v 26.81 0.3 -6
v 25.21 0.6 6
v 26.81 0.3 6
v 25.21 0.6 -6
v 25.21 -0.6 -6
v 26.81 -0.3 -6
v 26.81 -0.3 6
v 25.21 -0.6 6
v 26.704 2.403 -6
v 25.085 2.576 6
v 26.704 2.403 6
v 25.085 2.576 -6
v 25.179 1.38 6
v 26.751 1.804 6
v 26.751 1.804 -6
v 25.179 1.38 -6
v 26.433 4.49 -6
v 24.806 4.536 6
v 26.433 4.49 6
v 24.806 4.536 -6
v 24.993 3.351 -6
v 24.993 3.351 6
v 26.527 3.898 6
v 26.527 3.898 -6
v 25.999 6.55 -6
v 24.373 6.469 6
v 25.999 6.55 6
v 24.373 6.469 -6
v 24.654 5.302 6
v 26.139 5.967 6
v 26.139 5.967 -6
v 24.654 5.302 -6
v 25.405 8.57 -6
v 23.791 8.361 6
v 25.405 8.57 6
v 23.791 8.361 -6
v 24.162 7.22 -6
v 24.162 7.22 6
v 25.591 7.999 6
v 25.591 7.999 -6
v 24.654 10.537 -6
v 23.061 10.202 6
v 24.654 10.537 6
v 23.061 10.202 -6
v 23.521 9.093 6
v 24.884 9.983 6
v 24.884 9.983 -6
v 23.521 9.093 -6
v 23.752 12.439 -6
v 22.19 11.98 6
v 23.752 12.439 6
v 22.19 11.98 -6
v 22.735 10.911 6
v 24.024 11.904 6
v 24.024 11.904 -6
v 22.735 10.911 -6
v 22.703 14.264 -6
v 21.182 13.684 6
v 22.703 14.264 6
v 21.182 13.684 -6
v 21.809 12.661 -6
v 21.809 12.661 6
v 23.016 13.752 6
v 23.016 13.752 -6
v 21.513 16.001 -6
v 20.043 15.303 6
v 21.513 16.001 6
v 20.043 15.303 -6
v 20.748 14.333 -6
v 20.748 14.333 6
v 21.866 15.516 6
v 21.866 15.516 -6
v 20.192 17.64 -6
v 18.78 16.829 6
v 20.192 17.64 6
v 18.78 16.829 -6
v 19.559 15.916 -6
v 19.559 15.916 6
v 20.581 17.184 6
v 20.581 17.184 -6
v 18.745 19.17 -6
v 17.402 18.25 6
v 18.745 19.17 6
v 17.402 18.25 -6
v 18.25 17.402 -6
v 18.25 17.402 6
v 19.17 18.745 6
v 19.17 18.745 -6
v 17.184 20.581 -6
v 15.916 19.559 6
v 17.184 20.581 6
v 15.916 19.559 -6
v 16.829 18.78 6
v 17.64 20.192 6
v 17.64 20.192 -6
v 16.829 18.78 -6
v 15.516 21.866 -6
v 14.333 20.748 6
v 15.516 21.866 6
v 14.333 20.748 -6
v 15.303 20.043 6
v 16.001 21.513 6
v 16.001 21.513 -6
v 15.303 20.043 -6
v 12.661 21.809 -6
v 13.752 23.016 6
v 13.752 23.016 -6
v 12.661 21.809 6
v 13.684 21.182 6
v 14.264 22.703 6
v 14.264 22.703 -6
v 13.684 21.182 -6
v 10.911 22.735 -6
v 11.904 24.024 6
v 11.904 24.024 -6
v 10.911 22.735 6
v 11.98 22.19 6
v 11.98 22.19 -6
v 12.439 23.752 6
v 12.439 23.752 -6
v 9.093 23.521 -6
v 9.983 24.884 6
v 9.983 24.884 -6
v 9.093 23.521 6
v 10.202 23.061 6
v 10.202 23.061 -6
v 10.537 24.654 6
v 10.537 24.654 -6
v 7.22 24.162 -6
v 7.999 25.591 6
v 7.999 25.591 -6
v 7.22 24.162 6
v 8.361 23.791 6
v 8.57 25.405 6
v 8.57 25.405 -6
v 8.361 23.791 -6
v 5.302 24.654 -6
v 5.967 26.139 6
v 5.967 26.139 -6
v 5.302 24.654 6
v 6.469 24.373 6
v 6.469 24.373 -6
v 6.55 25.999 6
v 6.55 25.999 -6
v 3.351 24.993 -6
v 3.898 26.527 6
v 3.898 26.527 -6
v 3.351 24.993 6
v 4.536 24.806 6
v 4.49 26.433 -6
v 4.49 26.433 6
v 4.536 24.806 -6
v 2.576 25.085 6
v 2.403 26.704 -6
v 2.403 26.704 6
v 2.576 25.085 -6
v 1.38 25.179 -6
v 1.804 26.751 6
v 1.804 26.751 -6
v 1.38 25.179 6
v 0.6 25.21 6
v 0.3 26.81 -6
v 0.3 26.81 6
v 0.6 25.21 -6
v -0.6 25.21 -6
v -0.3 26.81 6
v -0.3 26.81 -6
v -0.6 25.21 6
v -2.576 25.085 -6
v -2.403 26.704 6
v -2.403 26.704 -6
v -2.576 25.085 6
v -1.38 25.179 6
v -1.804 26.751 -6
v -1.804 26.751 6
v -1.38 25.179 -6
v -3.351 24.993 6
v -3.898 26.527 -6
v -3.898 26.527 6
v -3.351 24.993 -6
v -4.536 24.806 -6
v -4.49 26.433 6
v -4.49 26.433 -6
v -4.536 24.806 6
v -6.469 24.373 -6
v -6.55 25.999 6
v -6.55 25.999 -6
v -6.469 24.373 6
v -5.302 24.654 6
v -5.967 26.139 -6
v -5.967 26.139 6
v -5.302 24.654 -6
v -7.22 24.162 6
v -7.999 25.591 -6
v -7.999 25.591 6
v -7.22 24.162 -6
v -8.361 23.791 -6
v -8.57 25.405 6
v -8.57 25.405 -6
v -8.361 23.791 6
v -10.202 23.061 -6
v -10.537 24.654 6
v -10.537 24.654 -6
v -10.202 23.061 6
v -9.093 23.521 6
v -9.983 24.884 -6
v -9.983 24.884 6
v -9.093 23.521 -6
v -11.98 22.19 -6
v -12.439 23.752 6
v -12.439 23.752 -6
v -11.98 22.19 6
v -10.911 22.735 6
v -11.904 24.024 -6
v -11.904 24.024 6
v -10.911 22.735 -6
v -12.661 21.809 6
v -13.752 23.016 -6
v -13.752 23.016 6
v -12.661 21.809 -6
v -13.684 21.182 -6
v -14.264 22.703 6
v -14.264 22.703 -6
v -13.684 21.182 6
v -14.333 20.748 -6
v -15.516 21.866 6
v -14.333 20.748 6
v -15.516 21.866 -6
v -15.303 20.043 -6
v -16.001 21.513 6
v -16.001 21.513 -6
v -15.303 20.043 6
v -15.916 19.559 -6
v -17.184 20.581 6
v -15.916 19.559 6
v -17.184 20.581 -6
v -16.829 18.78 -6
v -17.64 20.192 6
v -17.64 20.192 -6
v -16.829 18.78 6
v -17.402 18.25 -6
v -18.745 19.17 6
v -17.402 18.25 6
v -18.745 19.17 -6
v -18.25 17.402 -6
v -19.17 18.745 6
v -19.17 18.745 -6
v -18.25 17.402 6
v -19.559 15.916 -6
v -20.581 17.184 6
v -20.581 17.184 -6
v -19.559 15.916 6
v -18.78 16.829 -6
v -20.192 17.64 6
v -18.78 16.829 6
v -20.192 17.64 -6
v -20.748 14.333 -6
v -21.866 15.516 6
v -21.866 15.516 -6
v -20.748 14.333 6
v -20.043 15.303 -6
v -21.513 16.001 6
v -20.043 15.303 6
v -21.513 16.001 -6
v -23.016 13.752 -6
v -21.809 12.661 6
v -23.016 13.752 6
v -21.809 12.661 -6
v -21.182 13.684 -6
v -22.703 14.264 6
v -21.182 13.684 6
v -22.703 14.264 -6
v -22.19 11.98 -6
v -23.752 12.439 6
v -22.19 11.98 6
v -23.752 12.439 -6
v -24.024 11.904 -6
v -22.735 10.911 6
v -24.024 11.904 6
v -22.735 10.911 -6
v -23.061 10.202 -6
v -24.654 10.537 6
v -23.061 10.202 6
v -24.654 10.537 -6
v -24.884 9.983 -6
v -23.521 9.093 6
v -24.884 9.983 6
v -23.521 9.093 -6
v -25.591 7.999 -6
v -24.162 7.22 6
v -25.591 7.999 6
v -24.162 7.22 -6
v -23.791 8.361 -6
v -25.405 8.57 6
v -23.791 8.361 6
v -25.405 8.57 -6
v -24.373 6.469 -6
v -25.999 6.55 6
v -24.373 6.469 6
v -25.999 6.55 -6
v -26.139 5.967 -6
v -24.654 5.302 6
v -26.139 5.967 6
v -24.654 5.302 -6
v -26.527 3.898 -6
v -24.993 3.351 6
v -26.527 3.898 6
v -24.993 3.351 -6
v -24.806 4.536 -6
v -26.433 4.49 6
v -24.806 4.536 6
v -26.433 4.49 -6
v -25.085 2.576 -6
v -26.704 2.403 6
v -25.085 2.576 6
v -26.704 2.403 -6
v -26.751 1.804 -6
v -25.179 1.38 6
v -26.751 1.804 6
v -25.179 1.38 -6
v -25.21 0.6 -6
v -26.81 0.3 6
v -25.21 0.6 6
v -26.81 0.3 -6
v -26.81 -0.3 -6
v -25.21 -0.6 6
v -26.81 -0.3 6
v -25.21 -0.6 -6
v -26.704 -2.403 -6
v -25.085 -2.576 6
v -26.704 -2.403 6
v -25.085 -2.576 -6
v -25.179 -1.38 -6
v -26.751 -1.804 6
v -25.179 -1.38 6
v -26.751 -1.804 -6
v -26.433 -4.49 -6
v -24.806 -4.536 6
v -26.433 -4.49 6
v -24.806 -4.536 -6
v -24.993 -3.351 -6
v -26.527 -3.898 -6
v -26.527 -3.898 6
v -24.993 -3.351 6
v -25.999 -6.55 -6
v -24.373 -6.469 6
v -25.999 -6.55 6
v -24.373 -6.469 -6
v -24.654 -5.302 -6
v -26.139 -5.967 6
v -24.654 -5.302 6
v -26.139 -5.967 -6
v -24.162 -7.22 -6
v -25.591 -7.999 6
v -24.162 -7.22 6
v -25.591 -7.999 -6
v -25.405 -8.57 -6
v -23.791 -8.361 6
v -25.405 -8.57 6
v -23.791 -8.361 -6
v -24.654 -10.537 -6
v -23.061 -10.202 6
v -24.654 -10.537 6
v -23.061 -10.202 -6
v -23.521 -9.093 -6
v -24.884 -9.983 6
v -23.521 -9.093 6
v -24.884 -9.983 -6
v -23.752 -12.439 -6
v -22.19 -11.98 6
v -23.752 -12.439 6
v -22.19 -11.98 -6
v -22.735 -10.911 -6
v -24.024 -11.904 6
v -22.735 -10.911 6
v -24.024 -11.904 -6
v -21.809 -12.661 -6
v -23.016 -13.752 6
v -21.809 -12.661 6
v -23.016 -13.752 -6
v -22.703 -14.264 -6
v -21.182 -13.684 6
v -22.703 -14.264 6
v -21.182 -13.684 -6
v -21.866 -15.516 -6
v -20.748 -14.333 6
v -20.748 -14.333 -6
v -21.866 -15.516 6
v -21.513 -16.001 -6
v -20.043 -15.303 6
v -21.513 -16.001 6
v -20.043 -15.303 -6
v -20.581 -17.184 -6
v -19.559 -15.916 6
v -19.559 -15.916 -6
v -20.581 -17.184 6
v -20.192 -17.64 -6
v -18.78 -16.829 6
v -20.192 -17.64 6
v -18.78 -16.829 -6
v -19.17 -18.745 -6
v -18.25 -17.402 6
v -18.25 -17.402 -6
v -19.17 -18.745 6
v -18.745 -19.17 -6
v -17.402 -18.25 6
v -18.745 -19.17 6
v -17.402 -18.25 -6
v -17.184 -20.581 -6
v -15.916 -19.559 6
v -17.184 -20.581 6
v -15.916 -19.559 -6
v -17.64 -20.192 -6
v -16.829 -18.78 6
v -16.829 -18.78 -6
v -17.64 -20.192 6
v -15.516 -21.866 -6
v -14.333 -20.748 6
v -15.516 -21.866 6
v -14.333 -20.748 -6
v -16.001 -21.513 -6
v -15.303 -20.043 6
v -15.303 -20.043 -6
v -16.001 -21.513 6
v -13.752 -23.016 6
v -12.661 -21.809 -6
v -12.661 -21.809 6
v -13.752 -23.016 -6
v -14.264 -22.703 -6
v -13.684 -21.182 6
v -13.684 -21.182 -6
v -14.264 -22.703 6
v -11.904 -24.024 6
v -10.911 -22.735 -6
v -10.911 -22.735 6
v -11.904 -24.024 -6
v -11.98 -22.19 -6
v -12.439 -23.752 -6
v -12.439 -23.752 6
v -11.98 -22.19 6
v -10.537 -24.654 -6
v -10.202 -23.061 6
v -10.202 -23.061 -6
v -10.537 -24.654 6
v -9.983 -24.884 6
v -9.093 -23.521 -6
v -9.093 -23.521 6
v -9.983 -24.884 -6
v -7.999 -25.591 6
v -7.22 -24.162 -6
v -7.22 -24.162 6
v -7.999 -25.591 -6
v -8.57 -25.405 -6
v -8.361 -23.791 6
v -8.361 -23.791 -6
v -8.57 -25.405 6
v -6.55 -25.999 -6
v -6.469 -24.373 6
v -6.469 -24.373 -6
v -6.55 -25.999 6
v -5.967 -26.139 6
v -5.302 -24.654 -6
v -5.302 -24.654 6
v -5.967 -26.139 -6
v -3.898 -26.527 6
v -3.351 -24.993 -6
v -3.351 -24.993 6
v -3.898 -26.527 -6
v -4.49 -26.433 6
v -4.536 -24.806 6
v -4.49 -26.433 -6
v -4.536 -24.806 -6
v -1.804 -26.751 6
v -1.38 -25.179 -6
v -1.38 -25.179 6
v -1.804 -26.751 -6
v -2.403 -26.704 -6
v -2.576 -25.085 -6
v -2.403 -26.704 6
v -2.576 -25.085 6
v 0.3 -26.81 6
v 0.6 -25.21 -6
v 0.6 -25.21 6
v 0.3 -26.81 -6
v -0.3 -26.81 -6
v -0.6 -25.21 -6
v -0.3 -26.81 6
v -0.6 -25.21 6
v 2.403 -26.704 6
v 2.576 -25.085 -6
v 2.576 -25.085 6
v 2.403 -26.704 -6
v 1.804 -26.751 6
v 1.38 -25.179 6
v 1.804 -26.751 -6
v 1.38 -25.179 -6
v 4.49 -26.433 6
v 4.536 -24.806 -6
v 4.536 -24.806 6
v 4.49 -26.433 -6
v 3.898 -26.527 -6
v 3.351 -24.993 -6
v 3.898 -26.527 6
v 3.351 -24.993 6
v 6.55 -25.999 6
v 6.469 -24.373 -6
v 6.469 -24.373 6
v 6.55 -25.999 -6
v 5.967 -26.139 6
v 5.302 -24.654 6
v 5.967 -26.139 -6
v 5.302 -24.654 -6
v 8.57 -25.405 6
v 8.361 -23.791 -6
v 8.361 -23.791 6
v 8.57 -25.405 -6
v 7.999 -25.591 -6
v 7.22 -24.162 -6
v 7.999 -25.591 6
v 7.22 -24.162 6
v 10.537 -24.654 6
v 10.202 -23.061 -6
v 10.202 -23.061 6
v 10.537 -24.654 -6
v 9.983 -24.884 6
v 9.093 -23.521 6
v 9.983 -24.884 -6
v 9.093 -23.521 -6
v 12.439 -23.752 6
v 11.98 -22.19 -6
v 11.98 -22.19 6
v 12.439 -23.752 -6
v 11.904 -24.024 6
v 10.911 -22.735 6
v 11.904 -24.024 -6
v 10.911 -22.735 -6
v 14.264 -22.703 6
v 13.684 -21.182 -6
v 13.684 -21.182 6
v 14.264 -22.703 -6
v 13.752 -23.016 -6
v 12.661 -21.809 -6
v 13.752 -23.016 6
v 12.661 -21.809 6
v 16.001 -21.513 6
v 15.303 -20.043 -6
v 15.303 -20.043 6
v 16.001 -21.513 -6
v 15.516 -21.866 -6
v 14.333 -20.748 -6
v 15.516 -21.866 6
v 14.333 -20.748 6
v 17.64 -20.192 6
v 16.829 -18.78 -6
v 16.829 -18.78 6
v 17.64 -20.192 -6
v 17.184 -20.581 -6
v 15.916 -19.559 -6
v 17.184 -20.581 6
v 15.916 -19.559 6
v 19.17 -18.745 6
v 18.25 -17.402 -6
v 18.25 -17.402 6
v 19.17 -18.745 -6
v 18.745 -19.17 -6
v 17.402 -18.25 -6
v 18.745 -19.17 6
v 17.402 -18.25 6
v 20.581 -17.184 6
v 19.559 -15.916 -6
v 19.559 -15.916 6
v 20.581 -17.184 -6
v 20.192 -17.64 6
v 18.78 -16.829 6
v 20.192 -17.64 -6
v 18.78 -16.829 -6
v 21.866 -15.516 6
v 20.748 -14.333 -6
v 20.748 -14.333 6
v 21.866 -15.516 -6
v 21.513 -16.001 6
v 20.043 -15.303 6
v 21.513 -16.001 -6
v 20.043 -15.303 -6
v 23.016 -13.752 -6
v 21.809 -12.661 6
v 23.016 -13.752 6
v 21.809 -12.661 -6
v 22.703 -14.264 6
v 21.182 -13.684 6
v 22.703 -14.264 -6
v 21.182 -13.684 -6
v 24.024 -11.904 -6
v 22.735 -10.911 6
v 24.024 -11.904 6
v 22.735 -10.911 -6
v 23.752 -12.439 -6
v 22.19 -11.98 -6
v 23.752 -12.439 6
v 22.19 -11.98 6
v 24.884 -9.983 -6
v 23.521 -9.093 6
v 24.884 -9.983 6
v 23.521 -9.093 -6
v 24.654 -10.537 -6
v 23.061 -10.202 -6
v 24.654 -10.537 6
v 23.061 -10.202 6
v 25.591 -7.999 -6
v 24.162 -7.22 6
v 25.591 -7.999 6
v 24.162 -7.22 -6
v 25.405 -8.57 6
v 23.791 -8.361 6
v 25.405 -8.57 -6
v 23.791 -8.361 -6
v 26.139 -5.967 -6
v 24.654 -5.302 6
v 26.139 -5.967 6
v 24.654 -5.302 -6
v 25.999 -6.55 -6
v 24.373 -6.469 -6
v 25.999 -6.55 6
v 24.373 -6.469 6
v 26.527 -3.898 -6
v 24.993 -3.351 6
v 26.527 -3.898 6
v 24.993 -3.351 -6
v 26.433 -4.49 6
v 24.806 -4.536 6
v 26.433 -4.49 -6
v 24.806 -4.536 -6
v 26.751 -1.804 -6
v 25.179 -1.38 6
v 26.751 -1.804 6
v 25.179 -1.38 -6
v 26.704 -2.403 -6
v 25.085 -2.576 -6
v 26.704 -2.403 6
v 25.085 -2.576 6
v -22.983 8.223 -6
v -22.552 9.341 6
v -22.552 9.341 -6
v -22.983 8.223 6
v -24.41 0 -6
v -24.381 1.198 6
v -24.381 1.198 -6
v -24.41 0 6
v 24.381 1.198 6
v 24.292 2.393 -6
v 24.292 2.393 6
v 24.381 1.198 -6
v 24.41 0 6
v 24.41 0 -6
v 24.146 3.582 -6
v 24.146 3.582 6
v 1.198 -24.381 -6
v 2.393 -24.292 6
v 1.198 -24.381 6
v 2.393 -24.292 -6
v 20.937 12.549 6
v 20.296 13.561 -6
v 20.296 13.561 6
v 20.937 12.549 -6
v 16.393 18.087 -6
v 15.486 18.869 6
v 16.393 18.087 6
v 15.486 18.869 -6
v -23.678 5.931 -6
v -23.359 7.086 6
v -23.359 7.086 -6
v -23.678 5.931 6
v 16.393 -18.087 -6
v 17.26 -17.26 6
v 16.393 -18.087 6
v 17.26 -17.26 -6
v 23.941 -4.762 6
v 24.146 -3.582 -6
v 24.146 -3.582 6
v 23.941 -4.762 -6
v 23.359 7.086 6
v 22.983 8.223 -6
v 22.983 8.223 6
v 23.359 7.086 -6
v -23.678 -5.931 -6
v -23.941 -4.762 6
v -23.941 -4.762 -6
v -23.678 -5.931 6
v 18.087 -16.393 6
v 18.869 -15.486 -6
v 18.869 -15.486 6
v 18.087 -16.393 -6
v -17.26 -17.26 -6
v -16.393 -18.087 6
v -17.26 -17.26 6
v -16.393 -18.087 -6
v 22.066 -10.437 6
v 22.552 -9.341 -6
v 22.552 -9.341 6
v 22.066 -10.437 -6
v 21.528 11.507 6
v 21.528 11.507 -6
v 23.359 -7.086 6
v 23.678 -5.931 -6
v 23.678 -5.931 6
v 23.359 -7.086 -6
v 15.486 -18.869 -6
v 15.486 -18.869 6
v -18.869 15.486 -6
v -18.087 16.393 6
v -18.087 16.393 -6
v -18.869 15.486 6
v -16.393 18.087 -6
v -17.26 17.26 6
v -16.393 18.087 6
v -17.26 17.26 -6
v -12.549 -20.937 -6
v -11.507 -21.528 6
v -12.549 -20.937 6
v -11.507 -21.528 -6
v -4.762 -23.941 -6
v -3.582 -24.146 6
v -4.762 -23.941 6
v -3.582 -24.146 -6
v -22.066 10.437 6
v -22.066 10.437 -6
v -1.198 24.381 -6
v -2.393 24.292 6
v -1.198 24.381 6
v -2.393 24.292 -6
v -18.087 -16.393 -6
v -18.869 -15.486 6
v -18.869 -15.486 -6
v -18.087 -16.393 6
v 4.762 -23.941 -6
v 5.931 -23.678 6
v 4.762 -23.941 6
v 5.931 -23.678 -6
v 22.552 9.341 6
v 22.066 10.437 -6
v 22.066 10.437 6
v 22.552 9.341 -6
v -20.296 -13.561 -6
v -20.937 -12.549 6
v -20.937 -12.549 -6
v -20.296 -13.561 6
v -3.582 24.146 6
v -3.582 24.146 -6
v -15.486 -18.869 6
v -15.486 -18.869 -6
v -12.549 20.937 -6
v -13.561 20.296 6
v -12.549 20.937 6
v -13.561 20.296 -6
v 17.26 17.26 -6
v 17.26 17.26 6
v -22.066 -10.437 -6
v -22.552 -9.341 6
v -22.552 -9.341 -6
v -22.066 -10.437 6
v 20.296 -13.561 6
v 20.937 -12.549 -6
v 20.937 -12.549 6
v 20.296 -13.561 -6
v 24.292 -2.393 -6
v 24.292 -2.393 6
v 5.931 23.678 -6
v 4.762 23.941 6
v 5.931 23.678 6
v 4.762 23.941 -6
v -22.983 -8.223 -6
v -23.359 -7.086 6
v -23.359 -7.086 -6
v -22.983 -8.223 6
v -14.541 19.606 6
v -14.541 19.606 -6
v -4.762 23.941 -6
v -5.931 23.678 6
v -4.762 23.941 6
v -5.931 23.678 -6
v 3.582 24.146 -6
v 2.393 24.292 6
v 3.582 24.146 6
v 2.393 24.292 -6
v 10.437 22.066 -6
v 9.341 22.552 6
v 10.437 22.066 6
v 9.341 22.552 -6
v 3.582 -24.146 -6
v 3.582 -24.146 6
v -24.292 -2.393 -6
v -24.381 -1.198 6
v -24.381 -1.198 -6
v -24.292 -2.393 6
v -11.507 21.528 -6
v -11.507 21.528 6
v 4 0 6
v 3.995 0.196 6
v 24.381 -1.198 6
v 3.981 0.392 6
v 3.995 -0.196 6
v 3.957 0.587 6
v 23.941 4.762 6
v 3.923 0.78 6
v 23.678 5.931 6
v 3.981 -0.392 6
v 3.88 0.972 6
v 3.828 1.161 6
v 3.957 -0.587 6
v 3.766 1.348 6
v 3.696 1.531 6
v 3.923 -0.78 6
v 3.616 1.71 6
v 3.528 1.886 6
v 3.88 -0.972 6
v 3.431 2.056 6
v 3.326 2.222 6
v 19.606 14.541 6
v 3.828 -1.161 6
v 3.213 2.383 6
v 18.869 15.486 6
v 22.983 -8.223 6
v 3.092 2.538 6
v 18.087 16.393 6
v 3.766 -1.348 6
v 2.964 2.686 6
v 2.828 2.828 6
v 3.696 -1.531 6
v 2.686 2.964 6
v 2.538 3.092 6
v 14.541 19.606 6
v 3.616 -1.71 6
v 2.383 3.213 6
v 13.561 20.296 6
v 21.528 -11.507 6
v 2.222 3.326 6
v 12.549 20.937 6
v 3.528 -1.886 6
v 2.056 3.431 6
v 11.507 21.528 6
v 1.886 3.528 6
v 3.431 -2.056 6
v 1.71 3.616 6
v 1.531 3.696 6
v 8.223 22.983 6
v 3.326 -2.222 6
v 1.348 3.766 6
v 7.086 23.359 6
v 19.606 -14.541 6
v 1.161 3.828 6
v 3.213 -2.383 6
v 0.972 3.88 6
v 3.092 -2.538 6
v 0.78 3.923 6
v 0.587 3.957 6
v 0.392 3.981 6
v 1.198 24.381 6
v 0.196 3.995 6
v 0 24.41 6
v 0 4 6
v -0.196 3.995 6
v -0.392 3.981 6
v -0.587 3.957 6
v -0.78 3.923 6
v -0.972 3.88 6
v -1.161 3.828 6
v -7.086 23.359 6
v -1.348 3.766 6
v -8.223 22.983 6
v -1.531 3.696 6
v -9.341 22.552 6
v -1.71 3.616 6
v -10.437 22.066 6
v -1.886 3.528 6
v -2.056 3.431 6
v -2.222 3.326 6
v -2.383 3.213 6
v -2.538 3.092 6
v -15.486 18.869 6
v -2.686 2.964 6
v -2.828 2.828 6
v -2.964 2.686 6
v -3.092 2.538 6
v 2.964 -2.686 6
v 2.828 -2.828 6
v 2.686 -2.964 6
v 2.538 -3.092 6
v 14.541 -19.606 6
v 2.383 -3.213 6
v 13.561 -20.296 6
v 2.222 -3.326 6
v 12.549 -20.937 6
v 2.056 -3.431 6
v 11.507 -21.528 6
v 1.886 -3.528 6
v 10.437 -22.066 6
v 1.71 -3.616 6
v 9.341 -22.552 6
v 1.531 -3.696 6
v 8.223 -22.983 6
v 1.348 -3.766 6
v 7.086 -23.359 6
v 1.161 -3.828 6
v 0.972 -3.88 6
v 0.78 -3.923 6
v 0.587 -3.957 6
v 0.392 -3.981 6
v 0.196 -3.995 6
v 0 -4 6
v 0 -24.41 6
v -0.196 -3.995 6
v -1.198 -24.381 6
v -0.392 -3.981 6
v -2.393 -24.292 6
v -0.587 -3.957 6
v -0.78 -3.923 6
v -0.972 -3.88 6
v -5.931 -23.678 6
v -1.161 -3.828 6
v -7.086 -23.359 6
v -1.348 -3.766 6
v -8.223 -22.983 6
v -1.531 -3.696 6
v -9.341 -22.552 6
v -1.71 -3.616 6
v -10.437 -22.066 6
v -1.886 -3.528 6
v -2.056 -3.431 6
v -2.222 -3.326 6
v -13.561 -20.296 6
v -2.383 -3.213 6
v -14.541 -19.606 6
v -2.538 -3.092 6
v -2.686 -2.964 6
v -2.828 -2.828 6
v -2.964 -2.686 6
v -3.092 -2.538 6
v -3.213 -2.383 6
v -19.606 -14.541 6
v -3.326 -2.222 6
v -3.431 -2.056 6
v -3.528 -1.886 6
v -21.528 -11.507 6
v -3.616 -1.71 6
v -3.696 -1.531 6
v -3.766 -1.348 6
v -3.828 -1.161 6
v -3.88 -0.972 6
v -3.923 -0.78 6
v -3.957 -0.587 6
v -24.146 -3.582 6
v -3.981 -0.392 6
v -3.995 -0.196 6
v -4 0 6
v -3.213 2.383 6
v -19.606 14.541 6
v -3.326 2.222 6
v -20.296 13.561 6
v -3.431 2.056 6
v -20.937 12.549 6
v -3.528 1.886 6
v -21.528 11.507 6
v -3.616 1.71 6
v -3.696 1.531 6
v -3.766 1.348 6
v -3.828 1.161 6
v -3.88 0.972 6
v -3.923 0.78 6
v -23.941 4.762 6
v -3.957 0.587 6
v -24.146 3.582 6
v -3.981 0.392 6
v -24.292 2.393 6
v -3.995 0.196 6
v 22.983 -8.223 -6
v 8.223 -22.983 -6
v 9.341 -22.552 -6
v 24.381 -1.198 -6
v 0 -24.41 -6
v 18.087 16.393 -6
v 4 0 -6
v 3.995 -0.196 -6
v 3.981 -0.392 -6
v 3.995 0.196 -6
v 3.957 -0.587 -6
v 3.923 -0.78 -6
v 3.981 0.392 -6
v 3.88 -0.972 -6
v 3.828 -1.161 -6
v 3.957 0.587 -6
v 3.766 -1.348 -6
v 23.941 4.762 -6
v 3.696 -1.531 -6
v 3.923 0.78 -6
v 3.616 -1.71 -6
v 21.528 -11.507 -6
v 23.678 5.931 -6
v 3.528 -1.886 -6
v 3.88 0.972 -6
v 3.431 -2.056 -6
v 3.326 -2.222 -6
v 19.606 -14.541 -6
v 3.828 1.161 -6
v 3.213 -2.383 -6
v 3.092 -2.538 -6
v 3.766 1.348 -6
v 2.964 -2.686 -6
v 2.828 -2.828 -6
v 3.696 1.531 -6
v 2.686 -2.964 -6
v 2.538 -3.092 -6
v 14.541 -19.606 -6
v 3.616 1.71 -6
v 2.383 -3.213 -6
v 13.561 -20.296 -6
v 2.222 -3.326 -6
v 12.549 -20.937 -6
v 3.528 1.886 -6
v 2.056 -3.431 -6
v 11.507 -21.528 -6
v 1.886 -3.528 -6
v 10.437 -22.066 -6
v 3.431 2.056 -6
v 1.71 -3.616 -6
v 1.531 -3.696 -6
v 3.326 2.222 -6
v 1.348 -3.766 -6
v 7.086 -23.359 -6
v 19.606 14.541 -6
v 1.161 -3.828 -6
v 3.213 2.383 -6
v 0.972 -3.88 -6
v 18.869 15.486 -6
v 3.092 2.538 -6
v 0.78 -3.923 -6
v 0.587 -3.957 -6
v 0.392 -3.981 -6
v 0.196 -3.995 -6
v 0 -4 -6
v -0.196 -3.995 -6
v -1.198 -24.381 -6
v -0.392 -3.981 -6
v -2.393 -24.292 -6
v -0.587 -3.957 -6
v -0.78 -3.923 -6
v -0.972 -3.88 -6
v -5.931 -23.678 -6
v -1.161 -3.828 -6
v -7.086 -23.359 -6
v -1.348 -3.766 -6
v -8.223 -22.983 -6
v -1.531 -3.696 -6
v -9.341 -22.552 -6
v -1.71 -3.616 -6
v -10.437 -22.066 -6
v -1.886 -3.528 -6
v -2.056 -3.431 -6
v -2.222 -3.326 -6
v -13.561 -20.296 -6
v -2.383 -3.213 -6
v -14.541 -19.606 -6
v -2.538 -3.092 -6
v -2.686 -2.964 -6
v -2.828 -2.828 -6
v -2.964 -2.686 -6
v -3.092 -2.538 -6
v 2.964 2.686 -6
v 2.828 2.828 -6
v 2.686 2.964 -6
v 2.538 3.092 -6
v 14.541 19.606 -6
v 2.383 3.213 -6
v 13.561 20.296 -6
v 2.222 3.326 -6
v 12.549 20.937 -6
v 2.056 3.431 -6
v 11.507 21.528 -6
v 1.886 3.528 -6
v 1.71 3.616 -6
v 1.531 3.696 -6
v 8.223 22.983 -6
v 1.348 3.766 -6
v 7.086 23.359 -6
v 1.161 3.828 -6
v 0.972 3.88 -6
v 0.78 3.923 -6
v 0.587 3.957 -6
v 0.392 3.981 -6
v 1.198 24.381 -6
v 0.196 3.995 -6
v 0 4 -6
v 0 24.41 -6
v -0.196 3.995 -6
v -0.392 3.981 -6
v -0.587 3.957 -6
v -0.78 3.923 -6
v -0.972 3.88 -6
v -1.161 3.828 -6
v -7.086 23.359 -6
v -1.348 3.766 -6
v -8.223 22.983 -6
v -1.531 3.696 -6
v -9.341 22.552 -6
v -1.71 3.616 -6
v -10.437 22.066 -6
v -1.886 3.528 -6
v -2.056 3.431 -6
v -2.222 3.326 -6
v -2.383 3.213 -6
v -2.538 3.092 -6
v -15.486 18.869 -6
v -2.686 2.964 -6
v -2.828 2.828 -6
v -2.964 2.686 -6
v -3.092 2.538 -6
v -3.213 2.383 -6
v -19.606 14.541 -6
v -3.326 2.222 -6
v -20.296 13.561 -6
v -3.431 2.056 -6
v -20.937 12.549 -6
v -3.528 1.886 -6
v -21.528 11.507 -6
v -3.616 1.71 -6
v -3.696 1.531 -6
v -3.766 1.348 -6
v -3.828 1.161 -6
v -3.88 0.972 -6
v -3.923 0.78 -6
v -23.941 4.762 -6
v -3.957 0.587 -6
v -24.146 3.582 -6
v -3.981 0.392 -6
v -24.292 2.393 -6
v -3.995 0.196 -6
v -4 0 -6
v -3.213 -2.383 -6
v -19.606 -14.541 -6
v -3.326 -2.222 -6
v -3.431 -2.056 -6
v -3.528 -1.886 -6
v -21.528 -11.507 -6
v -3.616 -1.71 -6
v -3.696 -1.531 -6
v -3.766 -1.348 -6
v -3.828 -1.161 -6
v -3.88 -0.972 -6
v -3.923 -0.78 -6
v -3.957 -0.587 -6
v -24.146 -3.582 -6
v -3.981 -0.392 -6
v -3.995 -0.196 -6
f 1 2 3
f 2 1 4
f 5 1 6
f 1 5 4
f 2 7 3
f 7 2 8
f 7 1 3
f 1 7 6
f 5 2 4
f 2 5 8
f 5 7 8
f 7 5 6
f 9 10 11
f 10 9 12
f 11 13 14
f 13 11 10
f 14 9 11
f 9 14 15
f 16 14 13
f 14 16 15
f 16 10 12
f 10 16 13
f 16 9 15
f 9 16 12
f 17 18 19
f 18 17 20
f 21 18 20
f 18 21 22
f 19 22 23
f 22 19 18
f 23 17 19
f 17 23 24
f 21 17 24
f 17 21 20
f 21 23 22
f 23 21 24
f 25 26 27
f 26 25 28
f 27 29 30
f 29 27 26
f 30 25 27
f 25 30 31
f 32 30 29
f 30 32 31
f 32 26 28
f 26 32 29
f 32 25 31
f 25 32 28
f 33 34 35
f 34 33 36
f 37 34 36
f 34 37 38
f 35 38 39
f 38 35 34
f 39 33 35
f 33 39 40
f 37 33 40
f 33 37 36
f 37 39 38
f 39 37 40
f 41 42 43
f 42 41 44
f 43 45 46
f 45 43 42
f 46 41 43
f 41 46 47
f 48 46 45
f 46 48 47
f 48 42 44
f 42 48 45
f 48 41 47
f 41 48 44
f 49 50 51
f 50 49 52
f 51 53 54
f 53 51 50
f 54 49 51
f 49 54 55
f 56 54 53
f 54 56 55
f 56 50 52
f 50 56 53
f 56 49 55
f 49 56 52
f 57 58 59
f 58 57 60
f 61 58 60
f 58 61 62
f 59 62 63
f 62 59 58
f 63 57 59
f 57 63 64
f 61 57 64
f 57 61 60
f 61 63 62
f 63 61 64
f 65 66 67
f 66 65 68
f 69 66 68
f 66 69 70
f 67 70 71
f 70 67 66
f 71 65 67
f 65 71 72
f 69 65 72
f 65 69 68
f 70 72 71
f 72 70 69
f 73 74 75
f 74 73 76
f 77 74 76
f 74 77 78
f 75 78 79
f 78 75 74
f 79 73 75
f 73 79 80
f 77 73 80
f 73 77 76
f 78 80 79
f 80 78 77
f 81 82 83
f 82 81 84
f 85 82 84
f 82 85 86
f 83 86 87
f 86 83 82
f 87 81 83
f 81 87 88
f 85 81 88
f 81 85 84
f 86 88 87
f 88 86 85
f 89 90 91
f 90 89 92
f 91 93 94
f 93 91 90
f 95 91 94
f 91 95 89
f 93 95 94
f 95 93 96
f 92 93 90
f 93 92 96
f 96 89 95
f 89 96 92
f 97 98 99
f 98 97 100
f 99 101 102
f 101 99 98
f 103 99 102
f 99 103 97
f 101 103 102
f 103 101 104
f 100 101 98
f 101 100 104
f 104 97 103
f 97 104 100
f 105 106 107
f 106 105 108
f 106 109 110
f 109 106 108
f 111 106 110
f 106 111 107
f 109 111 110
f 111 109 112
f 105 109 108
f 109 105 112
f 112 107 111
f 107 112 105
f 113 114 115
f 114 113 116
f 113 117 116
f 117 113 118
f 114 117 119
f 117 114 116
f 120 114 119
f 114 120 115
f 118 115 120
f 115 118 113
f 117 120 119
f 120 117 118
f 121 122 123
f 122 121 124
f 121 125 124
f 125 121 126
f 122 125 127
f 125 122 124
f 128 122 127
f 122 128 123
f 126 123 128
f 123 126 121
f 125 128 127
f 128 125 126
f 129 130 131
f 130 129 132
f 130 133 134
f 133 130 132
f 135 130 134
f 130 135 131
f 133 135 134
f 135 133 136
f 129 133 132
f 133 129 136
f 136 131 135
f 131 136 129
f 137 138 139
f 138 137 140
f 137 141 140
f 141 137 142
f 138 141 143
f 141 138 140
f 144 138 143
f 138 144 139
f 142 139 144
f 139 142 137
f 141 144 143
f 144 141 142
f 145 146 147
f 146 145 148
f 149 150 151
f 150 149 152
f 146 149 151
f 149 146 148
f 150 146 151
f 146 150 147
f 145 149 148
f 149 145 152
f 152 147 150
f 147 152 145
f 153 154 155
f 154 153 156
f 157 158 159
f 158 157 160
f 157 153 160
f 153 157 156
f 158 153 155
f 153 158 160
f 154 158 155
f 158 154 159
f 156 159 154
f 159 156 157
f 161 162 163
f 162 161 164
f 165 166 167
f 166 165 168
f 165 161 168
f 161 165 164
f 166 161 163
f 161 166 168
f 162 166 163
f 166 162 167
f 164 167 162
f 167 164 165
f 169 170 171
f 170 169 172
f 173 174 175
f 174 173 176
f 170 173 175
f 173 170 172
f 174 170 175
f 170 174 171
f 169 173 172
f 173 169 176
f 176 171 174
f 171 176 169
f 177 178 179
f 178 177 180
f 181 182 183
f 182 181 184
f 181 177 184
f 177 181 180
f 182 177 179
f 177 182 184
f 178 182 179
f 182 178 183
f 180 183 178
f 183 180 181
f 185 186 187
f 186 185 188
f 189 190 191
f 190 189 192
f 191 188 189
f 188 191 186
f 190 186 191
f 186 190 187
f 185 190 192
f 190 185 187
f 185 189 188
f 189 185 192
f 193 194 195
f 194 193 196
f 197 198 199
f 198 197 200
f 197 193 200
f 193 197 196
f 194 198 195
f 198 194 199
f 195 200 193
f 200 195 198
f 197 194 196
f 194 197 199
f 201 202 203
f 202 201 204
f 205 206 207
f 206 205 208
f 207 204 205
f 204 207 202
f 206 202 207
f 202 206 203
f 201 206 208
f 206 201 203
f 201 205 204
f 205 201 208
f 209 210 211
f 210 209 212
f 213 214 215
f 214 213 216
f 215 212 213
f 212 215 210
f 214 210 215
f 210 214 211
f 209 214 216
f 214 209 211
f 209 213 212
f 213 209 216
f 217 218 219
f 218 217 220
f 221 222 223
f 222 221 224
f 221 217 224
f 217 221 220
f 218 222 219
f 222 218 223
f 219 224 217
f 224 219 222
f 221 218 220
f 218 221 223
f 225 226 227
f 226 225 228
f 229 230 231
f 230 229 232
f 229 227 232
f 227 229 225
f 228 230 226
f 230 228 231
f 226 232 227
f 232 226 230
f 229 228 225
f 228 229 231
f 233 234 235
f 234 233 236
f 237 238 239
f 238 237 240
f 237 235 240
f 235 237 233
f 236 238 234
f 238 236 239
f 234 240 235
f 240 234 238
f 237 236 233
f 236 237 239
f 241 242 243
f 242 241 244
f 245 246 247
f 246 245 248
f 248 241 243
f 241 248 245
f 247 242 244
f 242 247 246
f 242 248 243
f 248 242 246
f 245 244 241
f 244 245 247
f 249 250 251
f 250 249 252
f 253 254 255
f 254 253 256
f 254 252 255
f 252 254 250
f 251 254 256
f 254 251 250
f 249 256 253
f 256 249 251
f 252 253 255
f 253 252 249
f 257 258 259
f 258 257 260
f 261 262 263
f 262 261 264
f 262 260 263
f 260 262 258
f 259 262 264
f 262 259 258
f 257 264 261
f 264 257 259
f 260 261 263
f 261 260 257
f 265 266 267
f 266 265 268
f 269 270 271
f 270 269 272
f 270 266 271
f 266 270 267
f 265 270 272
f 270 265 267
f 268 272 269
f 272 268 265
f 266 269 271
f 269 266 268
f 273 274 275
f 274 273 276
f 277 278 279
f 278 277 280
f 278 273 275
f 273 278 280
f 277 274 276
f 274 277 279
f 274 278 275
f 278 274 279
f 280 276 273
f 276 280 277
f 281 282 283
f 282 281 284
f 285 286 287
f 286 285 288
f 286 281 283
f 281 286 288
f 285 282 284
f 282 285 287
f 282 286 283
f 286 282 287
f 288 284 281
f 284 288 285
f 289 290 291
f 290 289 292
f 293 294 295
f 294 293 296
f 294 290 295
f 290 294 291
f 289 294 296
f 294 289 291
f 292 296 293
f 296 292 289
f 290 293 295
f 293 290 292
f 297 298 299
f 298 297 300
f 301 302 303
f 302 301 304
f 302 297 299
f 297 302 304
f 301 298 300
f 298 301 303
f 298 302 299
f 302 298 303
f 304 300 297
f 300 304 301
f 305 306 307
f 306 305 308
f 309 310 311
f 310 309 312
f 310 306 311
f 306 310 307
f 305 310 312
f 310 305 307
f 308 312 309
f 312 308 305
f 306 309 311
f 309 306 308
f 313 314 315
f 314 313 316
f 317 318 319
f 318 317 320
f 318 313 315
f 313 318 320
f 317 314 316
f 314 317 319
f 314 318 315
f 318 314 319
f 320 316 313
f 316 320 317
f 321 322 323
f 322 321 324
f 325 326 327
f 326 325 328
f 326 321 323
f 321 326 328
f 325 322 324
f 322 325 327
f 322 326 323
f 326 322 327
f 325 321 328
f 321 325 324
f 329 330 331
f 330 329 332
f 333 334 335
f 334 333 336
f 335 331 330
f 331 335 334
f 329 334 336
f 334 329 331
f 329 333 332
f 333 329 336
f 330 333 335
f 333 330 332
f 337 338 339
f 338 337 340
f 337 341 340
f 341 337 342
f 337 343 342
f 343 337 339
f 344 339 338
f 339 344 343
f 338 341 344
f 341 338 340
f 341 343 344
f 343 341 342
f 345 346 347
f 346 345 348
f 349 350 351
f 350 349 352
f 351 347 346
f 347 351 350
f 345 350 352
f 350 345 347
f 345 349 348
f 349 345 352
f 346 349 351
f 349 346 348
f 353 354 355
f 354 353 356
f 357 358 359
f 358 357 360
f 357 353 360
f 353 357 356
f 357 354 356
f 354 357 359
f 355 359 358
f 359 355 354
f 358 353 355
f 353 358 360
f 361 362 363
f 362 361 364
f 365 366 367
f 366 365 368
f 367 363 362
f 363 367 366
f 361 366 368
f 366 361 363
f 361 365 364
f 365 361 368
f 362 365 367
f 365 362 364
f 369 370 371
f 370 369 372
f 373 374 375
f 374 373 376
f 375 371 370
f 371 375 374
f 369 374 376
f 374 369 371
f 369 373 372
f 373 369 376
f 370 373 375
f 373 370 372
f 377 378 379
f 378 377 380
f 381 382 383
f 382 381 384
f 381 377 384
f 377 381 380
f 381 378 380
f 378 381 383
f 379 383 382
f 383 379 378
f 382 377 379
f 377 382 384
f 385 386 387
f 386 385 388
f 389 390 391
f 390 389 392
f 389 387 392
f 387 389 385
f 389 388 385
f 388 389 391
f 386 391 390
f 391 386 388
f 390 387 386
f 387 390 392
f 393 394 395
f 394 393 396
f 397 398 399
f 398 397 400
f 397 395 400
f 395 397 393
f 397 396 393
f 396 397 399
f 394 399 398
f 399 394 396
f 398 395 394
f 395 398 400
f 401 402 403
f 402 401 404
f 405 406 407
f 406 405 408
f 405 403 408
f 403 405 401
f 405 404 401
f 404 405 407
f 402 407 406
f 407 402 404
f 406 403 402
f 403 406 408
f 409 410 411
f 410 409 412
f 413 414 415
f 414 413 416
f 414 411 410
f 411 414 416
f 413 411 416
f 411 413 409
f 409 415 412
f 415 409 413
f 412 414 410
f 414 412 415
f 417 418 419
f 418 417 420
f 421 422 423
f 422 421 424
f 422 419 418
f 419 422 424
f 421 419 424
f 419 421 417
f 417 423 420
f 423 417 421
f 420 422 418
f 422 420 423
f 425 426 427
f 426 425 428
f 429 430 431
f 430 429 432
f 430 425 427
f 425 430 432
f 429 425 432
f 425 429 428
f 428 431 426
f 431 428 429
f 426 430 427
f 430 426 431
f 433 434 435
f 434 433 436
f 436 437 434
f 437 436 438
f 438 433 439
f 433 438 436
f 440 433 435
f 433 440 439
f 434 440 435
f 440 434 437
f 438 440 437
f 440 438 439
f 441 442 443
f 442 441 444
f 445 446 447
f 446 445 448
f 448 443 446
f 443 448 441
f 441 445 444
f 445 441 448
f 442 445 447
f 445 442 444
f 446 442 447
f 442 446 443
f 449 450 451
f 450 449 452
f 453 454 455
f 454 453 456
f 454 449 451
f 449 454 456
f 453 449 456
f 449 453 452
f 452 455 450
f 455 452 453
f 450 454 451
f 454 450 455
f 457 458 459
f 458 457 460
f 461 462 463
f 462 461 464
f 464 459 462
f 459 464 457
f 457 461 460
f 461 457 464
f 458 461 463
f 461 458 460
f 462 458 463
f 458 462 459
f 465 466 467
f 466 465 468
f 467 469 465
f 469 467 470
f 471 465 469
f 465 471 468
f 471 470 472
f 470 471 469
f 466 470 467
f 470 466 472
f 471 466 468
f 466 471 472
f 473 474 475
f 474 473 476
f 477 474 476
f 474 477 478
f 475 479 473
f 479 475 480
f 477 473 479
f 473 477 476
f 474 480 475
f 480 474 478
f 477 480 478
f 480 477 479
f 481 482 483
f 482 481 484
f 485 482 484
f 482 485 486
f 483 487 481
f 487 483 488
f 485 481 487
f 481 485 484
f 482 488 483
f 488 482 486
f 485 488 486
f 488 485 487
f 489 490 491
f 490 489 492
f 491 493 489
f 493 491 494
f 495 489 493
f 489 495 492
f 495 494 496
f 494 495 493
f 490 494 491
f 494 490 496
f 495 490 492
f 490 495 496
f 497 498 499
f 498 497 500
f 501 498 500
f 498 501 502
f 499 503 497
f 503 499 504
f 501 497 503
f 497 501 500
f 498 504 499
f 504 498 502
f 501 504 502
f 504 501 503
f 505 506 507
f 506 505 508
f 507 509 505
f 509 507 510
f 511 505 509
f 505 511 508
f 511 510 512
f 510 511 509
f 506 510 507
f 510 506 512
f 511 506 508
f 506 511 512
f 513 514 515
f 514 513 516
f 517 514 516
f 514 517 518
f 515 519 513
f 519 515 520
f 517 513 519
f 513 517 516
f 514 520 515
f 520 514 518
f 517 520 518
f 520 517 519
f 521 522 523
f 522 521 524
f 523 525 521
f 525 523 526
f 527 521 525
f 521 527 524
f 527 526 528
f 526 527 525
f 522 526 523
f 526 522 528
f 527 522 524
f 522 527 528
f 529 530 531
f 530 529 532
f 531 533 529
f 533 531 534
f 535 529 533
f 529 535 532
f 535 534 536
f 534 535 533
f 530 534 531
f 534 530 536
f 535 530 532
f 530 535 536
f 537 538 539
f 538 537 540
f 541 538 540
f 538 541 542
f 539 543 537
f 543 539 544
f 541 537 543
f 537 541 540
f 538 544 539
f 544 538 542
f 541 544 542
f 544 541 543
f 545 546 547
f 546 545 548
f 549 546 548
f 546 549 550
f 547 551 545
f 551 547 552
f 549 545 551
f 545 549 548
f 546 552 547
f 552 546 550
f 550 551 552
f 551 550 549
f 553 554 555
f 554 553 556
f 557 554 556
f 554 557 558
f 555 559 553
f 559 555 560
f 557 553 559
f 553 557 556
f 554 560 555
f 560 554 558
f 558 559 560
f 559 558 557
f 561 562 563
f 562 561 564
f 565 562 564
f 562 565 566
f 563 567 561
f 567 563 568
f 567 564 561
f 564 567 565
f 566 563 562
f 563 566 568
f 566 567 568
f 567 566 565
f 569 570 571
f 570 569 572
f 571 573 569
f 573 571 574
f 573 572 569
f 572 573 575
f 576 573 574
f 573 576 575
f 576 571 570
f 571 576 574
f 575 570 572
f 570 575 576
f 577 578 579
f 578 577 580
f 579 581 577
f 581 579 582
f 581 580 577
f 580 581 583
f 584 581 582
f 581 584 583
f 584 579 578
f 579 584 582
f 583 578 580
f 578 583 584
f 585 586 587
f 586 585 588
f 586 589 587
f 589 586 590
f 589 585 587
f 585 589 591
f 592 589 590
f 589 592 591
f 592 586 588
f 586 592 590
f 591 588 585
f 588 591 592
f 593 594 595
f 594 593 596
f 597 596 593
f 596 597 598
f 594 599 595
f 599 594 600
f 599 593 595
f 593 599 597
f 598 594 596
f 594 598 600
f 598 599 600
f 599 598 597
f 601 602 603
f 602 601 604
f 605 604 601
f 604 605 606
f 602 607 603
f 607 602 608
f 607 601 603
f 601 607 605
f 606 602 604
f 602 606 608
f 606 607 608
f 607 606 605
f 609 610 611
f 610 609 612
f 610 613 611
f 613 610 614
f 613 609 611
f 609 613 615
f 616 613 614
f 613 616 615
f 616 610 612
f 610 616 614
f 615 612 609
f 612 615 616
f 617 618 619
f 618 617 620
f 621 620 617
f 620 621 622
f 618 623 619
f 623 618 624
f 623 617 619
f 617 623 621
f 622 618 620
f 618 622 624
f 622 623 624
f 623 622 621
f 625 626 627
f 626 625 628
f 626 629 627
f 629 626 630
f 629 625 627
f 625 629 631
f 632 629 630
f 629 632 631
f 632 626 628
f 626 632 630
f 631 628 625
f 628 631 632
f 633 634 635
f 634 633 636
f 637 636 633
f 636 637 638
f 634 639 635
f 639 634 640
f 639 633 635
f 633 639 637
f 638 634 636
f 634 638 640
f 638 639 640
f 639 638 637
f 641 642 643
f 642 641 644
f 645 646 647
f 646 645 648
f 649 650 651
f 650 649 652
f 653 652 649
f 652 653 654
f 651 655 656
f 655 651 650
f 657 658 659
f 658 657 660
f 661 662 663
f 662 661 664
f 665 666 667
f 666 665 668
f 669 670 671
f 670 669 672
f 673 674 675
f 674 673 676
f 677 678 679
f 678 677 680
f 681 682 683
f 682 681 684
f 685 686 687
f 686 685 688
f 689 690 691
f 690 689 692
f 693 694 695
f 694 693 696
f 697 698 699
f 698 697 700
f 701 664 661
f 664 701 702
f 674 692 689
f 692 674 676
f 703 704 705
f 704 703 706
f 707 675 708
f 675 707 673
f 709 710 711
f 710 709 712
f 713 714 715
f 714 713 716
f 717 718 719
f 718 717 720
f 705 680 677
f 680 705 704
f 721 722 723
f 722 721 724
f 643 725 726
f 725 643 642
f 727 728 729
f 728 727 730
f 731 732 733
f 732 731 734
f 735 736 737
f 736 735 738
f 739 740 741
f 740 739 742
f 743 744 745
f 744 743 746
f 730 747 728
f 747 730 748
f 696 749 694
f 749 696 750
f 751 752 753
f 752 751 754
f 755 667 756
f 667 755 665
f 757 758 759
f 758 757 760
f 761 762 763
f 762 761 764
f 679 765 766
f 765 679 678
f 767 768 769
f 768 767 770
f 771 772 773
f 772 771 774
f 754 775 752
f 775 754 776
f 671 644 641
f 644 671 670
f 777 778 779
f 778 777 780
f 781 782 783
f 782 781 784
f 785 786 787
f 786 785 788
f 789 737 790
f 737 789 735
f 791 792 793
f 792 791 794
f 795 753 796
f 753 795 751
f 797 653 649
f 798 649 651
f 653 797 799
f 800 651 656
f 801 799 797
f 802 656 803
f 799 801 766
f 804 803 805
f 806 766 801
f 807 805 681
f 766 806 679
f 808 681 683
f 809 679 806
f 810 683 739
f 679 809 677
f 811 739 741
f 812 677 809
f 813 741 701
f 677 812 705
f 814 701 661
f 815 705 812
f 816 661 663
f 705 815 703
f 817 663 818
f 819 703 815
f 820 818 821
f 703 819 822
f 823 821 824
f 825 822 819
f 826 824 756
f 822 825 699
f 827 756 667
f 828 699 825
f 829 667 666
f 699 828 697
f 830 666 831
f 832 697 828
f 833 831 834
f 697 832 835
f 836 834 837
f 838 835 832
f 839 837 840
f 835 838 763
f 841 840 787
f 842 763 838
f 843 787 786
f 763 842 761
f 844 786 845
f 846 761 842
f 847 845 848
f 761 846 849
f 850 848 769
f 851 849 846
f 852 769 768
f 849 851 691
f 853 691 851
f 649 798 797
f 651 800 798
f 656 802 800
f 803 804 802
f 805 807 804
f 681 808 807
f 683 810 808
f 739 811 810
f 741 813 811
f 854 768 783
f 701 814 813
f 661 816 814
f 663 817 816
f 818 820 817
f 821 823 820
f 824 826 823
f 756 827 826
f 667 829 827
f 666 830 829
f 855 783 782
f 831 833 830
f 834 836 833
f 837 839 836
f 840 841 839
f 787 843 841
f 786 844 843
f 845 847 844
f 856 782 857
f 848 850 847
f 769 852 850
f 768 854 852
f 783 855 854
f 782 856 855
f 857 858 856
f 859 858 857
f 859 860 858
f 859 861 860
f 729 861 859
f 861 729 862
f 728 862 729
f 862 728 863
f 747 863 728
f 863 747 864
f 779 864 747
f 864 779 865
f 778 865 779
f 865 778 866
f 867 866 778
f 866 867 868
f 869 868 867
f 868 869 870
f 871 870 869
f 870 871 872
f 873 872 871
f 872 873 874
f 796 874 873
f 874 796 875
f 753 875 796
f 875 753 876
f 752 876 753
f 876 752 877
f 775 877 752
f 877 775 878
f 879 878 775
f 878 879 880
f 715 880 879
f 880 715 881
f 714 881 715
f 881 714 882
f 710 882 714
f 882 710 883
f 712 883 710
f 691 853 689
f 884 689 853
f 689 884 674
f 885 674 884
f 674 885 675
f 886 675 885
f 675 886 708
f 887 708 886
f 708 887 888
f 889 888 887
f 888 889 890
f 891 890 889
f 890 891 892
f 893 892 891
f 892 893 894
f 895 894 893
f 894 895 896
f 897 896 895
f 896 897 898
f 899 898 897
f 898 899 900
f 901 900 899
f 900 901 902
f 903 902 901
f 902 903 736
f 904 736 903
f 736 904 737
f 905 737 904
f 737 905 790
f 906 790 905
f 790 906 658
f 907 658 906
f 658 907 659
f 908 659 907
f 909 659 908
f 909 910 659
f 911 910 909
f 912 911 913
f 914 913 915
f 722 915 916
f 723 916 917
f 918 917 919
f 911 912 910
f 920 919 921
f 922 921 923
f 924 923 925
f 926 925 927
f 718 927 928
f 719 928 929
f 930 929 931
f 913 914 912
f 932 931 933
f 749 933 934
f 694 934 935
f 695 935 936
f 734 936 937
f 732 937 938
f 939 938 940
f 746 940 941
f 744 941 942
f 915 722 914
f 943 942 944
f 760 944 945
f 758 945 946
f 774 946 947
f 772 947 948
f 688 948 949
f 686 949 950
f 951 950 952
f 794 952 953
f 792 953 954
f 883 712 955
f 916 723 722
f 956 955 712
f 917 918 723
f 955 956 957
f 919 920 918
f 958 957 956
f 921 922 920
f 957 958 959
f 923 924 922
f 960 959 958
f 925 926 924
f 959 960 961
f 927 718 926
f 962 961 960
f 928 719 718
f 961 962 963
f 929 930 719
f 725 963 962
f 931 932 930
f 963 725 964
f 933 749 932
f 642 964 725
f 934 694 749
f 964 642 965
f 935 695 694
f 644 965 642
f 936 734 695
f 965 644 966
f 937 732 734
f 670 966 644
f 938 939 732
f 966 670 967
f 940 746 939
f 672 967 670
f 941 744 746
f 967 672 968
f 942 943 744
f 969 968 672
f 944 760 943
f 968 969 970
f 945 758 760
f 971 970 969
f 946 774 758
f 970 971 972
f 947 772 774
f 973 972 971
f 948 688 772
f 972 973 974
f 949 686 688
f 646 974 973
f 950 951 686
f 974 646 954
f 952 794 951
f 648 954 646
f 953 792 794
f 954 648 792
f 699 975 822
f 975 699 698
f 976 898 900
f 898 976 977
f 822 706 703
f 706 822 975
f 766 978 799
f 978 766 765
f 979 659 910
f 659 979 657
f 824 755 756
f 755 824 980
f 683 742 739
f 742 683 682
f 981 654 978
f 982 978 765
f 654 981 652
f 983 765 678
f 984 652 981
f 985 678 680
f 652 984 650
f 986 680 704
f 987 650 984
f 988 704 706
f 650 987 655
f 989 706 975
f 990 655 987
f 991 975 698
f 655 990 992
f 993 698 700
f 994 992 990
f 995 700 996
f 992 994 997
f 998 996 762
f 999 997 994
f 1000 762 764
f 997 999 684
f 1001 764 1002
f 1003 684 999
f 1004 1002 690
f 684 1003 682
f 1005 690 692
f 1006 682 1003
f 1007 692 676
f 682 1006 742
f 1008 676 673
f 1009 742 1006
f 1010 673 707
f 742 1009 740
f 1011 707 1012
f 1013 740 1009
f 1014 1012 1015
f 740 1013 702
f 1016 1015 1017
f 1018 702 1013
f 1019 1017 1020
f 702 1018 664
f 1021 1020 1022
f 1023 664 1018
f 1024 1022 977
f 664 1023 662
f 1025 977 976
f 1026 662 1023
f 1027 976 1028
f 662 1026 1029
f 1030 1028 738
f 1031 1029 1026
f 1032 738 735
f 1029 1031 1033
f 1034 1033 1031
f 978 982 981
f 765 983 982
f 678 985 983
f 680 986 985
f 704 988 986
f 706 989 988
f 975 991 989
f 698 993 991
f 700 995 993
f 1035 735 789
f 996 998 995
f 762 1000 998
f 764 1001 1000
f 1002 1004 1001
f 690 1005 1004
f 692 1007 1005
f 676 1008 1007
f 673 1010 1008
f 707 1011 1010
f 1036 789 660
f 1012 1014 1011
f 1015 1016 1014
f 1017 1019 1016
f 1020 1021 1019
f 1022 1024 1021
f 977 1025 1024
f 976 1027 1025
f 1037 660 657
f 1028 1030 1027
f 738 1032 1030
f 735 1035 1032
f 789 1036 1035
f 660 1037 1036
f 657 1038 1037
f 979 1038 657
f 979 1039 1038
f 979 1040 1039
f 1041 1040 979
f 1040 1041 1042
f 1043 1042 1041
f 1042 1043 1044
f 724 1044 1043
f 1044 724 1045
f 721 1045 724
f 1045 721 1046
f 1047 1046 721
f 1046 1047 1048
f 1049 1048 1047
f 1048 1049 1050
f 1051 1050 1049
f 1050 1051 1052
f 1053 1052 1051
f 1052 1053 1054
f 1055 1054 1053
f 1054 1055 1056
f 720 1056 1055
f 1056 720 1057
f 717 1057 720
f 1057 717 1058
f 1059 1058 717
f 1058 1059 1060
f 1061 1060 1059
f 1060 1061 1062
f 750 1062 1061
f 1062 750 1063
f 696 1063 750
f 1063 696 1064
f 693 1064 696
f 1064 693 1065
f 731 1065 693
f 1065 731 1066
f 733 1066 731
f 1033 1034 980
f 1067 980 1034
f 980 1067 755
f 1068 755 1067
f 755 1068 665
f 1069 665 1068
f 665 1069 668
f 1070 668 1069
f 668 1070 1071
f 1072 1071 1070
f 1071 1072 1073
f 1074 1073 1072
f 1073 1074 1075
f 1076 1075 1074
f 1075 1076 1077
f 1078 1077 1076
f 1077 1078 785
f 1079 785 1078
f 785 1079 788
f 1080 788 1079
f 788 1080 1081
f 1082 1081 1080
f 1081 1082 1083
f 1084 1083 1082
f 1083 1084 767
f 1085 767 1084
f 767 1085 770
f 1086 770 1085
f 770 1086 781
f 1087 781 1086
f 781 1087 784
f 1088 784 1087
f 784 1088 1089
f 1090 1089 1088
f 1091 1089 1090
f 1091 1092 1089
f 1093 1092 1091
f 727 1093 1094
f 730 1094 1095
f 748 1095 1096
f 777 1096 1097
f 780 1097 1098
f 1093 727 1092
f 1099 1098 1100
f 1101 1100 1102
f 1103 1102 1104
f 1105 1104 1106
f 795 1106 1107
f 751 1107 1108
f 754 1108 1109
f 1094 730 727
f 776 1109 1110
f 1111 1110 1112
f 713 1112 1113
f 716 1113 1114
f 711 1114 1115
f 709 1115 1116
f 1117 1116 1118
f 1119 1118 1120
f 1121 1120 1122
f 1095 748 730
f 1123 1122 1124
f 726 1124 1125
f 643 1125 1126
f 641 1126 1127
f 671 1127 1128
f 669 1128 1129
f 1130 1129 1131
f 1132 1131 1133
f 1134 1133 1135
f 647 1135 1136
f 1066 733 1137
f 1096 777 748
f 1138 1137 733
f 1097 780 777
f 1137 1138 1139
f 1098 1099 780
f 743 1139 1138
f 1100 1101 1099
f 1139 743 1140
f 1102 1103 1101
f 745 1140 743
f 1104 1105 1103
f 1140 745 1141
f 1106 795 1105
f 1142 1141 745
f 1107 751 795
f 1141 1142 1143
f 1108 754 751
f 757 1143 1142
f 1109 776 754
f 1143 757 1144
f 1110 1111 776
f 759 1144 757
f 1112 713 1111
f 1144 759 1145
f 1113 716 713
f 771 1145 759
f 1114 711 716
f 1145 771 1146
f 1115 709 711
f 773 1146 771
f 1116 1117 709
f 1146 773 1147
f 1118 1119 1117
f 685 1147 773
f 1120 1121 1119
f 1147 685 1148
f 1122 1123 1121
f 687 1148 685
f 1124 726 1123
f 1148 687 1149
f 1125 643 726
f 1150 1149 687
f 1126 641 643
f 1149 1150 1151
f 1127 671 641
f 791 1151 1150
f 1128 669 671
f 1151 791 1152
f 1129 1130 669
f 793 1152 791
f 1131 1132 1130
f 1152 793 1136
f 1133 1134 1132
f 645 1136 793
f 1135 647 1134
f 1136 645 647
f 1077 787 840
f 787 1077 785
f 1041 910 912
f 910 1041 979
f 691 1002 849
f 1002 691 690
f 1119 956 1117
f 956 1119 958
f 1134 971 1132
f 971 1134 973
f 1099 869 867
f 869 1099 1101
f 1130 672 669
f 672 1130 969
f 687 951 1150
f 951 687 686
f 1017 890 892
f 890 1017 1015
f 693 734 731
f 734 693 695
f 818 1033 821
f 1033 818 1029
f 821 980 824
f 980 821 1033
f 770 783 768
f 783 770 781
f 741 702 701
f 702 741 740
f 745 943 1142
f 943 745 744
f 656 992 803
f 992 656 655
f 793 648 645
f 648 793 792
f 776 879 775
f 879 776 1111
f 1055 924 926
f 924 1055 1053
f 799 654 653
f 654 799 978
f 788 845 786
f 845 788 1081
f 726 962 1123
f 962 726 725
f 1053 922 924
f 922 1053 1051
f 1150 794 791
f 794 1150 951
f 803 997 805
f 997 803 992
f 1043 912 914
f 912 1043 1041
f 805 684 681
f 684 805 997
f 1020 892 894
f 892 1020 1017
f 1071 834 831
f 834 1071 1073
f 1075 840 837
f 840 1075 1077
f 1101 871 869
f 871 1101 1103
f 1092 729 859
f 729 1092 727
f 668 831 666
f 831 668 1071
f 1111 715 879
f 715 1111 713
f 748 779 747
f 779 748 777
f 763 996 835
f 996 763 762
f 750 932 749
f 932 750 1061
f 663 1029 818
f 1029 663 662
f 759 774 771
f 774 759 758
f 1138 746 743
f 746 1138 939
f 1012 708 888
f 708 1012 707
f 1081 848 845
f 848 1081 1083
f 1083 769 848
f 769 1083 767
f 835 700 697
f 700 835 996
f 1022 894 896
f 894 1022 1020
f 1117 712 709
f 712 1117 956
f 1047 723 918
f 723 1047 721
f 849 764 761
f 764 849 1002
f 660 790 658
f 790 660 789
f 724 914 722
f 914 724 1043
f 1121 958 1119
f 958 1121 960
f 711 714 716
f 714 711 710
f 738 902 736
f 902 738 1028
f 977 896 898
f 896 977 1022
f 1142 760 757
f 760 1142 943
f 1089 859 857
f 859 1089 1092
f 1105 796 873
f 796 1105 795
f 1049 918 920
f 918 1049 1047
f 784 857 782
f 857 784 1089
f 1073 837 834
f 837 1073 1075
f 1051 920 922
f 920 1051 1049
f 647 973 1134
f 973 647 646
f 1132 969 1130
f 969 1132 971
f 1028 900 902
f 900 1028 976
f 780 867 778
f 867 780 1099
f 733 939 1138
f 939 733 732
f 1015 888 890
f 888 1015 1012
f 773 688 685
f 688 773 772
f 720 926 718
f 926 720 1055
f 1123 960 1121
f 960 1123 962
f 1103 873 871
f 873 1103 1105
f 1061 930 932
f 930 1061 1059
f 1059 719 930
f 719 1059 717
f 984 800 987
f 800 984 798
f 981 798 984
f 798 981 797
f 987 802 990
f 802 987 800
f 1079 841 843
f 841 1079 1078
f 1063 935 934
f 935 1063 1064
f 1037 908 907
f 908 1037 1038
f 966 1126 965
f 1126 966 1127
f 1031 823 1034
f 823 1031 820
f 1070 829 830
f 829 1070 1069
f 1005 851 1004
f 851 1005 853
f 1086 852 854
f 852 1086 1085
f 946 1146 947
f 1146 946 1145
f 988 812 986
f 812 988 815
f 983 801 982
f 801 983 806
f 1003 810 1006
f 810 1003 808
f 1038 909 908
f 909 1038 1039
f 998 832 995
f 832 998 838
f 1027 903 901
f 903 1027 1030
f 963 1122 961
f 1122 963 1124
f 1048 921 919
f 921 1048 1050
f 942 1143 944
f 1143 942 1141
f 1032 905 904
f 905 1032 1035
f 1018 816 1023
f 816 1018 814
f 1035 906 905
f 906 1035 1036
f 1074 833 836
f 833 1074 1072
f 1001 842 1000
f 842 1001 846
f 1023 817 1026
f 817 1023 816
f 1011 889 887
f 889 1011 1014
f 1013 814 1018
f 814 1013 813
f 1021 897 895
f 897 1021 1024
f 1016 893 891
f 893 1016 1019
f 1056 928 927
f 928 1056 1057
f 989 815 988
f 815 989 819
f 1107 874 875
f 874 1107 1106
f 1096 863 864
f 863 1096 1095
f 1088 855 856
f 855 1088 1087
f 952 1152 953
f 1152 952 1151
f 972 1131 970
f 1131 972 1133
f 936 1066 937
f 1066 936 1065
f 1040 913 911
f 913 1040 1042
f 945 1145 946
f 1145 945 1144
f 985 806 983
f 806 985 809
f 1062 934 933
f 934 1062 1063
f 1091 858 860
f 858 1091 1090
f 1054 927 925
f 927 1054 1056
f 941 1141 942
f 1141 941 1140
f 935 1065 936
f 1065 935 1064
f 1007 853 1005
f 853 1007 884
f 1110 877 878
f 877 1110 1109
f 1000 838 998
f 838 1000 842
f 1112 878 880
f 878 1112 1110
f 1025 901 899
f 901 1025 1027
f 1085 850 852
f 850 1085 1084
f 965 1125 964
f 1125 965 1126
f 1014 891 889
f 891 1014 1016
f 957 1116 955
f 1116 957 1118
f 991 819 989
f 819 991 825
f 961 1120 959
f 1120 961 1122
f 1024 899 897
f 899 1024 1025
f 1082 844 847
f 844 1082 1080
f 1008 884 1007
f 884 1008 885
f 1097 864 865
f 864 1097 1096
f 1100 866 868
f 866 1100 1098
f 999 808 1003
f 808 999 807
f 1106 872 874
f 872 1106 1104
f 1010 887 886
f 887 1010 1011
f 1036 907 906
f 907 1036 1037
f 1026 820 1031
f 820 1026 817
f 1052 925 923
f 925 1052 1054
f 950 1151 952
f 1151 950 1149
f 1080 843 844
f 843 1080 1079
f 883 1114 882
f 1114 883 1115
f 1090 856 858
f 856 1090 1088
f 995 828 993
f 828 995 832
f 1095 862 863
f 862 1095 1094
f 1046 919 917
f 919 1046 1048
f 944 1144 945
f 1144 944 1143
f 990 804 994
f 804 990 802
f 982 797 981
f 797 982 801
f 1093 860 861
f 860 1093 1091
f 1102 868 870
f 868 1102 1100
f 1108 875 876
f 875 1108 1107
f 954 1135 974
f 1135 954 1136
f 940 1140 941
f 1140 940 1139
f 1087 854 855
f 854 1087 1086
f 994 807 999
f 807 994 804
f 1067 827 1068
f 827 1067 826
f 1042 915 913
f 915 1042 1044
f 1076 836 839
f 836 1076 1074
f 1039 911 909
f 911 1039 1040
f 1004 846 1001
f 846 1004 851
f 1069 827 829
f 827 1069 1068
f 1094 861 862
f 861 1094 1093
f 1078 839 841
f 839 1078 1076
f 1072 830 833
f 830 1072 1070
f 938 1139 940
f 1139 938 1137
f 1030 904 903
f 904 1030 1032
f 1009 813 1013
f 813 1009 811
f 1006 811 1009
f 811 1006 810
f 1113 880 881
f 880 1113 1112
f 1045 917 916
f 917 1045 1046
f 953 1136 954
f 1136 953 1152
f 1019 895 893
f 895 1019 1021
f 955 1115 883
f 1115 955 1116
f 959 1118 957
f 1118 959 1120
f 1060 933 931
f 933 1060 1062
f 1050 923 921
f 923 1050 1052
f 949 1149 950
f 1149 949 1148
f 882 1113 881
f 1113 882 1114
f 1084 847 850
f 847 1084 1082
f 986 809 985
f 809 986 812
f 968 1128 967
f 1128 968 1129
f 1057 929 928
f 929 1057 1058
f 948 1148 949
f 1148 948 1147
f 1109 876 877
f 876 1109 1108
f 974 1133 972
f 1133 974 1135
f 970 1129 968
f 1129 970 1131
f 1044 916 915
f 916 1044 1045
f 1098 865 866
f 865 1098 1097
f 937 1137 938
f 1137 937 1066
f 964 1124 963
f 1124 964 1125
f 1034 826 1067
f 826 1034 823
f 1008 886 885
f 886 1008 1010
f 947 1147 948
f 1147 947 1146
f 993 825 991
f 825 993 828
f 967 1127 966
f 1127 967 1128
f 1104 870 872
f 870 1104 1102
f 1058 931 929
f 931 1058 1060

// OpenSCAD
$fn=128;

teeth = 80;
pitch_d = 50.42;          // mm
pitch_r = pitch_d/2;

pulley_width = 12;        // mm
hub_d = 28;               // mm
bore_d = 8;               // mm

// Approximate GT2-like tooth geometry (parametric, not standard-verified)
tooth_height = 1.6;       // mm radial height above pitch radius
tooth_base_thickness = 1.2; // mm tangential thickness at base
tooth_top_thickness  = 0.6; // mm tangential thickness at top

root_clearance = 0.8;     // mm below pitch radius
root_r = pitch_r - root_clearance;
outer_r = pitch_r + tooth_height;

module tooth2d(rb, rt, tb, tt) {
    polygon(points=[
        [rb, -tb/2],
        [rb,  tb/2],
        [rt,  tt/2],
        [rt, -tt/2]
    ]);
}

module teeth_ring() {
    for (i = [0:teeth-1]) {
        rotate([0,0, i*360/teeth])
            linear_extrude(height=pulley_width, center=true, convexity=10)
                tooth2d(pitch_r, outer_r, tooth_base_thickness, tooth_top_thickness);
    }
}

module pulley_body() {
    union() {
        cylinder(h=pulley_width, r=root_r, center=true);
        teeth_ring();
        cylinder(h=pulley_width, d=hub_d, center=true);
    }
}

difference() {
    pulley_body();
    cylinder(h=pulley_width+2, d=bore_d, center=true);
}
